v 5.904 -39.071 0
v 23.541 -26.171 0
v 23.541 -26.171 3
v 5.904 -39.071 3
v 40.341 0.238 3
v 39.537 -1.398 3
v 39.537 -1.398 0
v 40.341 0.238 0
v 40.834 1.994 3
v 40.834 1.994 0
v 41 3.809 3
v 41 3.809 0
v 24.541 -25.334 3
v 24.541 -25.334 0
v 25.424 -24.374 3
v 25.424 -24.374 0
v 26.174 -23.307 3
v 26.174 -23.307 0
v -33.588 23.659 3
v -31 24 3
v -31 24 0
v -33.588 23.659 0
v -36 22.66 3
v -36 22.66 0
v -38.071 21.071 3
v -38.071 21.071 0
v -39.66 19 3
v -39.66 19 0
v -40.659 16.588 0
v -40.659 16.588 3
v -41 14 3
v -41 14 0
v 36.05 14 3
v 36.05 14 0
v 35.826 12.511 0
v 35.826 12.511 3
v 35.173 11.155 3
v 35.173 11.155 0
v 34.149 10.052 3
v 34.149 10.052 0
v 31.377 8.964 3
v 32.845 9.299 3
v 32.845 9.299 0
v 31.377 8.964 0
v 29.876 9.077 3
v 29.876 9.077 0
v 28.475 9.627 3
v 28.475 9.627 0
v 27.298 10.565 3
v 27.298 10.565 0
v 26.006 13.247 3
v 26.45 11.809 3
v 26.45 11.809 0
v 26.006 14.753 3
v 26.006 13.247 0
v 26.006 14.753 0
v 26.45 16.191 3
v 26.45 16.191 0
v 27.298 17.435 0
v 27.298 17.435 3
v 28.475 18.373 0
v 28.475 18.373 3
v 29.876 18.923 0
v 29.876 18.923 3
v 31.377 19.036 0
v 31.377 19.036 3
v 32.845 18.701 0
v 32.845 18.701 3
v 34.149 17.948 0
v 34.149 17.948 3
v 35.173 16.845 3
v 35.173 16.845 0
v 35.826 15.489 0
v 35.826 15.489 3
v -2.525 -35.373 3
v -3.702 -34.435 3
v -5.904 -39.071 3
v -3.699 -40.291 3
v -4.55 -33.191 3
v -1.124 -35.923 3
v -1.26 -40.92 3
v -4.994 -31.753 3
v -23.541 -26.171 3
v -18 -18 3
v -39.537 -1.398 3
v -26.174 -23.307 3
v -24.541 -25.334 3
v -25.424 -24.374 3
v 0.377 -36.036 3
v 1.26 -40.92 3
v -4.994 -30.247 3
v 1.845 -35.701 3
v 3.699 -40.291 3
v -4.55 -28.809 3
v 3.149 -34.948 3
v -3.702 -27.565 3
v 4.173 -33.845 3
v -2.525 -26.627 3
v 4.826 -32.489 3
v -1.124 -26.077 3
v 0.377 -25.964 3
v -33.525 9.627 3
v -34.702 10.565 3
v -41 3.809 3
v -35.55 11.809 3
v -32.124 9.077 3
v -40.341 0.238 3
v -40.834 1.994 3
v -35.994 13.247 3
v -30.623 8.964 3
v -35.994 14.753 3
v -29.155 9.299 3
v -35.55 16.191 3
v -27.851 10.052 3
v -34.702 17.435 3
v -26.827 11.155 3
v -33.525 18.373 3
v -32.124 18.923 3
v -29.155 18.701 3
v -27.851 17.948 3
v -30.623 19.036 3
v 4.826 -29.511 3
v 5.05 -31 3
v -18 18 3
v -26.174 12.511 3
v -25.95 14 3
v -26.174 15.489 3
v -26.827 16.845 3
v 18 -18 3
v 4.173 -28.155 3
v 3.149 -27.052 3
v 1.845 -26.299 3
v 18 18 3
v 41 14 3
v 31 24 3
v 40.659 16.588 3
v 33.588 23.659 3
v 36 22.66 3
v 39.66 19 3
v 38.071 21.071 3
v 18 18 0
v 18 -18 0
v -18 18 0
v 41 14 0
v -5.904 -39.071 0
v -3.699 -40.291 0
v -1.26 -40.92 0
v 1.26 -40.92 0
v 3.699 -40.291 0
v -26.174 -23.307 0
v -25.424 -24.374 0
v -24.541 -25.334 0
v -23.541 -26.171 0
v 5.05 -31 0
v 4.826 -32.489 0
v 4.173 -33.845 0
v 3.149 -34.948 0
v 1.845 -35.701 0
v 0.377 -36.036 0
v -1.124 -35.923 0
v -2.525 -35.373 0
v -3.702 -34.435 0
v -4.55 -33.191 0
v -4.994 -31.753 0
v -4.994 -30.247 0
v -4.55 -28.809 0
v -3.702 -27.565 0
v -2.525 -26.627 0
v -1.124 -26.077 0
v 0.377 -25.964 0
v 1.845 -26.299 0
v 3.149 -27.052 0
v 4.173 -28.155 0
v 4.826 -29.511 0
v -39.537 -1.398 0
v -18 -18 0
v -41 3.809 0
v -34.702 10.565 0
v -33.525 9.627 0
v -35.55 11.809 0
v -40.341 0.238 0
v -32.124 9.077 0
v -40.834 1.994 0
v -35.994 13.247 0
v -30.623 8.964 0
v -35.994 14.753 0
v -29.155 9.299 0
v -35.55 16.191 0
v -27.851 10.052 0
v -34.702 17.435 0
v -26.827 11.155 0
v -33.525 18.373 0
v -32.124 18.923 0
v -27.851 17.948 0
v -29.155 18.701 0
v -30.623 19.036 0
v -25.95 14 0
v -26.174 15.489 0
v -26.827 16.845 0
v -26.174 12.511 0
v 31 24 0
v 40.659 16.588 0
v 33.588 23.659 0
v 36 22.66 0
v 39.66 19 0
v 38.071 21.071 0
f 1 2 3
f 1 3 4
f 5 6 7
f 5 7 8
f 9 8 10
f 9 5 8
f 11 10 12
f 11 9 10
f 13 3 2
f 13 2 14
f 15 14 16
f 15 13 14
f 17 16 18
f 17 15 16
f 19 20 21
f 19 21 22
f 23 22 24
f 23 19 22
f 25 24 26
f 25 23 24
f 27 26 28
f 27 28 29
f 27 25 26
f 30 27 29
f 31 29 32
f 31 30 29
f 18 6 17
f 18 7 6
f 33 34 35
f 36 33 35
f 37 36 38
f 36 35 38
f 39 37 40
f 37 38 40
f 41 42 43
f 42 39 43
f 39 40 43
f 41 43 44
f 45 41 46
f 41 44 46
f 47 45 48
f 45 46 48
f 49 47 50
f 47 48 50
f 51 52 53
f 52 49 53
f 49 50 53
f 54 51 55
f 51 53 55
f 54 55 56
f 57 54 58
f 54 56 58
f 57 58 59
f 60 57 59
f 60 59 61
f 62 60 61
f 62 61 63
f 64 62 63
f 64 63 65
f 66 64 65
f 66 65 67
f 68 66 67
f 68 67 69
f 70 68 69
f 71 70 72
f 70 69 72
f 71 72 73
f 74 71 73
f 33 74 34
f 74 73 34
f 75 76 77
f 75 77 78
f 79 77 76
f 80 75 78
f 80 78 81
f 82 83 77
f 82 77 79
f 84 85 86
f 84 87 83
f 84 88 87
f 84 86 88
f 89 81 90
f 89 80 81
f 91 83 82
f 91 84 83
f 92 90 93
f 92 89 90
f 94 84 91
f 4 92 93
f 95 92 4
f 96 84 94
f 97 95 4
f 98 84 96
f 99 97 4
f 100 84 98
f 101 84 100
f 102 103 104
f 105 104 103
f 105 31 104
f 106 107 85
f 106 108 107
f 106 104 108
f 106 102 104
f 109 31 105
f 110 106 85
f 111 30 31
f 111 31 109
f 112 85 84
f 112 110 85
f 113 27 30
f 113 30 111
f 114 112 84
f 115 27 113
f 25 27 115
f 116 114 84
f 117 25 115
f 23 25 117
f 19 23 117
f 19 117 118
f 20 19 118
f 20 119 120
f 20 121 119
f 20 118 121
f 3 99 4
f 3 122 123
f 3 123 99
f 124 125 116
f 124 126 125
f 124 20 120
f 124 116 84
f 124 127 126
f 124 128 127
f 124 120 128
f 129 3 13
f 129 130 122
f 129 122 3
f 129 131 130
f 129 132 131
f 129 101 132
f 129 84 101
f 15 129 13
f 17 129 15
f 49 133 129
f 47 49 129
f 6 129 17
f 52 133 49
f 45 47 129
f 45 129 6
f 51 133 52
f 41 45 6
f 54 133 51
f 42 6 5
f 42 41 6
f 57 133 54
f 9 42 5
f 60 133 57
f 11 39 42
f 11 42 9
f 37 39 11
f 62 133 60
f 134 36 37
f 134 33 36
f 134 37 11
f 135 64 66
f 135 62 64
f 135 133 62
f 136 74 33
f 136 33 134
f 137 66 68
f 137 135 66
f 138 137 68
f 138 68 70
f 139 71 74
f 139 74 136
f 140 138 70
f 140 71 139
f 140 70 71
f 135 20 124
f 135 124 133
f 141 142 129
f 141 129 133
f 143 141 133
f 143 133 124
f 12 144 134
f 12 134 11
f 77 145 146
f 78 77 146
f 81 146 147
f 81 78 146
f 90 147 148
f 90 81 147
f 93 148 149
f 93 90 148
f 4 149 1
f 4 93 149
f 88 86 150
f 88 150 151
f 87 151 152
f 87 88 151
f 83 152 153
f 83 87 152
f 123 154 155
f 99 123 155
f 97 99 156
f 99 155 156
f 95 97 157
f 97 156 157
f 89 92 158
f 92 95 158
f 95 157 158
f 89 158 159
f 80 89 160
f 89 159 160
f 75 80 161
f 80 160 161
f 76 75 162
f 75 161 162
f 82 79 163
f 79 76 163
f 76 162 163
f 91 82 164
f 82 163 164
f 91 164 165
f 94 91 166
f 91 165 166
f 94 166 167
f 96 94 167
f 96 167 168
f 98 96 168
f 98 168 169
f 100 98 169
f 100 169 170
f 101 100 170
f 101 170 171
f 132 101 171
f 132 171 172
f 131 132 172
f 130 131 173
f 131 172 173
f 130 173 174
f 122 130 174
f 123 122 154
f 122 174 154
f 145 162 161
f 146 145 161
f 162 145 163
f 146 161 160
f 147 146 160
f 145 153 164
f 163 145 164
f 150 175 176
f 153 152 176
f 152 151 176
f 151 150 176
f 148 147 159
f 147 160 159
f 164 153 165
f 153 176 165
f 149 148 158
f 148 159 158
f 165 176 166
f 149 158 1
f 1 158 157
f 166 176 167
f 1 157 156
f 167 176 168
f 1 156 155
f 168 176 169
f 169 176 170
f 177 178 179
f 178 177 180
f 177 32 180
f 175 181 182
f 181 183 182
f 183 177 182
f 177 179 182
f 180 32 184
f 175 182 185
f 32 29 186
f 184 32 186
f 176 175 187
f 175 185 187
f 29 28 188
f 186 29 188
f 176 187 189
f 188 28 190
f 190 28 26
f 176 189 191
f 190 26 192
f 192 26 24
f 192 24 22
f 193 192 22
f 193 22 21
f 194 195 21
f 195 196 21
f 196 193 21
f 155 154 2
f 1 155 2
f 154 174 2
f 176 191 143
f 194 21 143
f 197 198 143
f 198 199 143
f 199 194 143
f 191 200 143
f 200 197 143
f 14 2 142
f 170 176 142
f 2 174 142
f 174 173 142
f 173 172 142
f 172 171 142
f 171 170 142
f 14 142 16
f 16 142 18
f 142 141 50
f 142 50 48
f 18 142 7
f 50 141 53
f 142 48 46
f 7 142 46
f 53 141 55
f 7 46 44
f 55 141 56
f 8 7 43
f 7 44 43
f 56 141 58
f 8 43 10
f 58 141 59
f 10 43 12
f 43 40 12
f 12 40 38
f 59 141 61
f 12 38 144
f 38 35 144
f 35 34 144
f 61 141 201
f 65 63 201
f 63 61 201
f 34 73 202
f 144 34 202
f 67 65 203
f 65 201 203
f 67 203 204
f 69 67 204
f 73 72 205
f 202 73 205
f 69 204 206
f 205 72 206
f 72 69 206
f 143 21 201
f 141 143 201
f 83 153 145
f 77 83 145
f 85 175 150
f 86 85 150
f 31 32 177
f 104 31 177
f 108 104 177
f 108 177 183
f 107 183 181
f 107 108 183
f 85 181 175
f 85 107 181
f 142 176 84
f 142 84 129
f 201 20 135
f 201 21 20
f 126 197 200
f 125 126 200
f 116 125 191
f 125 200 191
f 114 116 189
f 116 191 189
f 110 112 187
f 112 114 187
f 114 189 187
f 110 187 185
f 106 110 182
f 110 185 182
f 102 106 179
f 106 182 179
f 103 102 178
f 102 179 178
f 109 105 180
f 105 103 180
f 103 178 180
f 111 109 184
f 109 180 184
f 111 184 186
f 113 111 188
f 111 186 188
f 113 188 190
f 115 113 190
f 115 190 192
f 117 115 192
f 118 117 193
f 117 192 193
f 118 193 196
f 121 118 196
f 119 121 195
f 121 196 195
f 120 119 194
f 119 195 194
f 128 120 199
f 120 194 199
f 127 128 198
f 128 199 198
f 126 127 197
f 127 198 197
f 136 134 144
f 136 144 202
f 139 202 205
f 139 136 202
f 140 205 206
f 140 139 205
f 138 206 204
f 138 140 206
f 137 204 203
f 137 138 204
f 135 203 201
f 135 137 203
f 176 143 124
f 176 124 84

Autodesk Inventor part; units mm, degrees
ref_plane "YZ Plane" through (0, 0, 0) normal (1, 0, 0) x (0, 1, 0)
ref_plane "XZ Plane" through (0, 0, 0) normal (0, 1, 0) x (-1, 0, 0)
ref_plane "XY Plane" through (0, 0, 0) normal (0, 0, 1) x (1, 0, 0)
sketch "Sketch6" plane through (0, 0, 0) normal (0, 0, 1) x (1, 0, 0)
  line L0 (18, 18) -> (-18, 18)
  line L1 (-18, 18) -> (-18, -18)
  line L2 (-18, -18) -> (18, -18)
  line L3 (18, -18) -> (18, 18)
  line L4 (18, 18) -> (-18, -18) construction
  circle A0 centre (0, -31) radius 5.05
  circle A1 centre (31, 14) radius 5.05
  circle A2 centre (-31, 14) radius 5.05
  line L5 (31, 14) -> (-31, 14) construction
  line L6 (-31, 14) -> (0, -31) construction
  line L7 (0, -31) -> (31, 14) construction
  line L8 (0, 18) -> (0, -18) construction
  line L9 (-41, 24) -> (41, 24)
  line L10 (41, 24) -> (41, 1)
  line L11 (41, 1) -> (25.1414, -25)
  line L12 (25.1414, -25) -> (0, -43.3896)
  line L13 (-41, 24) -> (-41, 1)
  line L14 (-41, 1) -> (-25.1414, -25)
  line L15 (-25.1414, -25) -> (0, -43.3896)
  point P0 (0, 0)
  point P1 (0, 0)
  point P2 (60, 0)
  dimension "d30" = 36
  dimension "d31" = 36
  dimension "d33" = 10.1
  dimension "d37" = 54.6443
  dimension "d43" = 13
  dimension "d44" = 13
  dimension "d45" = 6
  dimension "d46" = 10
  dimension "d47" = 10
  dimension "d48" = 10
  dimension "d49" = 23
  dimension "d50" = 7
  dimension "d51" = 10
extrude "Plate3" add sketch "Sketch6" along normal blind 3
fillet "Corner Round1" radius 10 7 edges at (-41, 24, 1.5) (41, 24, 1.5) (41, 1, 1.5) (25.1414, -25, 1.5) (0, -43.3896, 1.5) (-25.1414, -25, 1.5) (-41, 1, 1.5)
equation "\"d41\" = Thickness"
equation "\"BendReliefWidth\" = Thickness"
equation "\"BendReliefDepth\" = 0.5 * Thickness"
equation "\"CornerReliefSize\" = 4 * Thickness"
equation "\"MinimumRemnant\" = 2 * Thickness"
equation "\"TransitionRadius\" = BendRadius"
equation "\"JacobiRadiusSize\" = BendRadius"
equation "\"GapSize\" = Thickness"
equation "\"Thickness\" = 3"
equation "\"BendRadius\" = 5"
properties part number "MNT-CDF-504 small tube flange" material "Stainless Steel"
